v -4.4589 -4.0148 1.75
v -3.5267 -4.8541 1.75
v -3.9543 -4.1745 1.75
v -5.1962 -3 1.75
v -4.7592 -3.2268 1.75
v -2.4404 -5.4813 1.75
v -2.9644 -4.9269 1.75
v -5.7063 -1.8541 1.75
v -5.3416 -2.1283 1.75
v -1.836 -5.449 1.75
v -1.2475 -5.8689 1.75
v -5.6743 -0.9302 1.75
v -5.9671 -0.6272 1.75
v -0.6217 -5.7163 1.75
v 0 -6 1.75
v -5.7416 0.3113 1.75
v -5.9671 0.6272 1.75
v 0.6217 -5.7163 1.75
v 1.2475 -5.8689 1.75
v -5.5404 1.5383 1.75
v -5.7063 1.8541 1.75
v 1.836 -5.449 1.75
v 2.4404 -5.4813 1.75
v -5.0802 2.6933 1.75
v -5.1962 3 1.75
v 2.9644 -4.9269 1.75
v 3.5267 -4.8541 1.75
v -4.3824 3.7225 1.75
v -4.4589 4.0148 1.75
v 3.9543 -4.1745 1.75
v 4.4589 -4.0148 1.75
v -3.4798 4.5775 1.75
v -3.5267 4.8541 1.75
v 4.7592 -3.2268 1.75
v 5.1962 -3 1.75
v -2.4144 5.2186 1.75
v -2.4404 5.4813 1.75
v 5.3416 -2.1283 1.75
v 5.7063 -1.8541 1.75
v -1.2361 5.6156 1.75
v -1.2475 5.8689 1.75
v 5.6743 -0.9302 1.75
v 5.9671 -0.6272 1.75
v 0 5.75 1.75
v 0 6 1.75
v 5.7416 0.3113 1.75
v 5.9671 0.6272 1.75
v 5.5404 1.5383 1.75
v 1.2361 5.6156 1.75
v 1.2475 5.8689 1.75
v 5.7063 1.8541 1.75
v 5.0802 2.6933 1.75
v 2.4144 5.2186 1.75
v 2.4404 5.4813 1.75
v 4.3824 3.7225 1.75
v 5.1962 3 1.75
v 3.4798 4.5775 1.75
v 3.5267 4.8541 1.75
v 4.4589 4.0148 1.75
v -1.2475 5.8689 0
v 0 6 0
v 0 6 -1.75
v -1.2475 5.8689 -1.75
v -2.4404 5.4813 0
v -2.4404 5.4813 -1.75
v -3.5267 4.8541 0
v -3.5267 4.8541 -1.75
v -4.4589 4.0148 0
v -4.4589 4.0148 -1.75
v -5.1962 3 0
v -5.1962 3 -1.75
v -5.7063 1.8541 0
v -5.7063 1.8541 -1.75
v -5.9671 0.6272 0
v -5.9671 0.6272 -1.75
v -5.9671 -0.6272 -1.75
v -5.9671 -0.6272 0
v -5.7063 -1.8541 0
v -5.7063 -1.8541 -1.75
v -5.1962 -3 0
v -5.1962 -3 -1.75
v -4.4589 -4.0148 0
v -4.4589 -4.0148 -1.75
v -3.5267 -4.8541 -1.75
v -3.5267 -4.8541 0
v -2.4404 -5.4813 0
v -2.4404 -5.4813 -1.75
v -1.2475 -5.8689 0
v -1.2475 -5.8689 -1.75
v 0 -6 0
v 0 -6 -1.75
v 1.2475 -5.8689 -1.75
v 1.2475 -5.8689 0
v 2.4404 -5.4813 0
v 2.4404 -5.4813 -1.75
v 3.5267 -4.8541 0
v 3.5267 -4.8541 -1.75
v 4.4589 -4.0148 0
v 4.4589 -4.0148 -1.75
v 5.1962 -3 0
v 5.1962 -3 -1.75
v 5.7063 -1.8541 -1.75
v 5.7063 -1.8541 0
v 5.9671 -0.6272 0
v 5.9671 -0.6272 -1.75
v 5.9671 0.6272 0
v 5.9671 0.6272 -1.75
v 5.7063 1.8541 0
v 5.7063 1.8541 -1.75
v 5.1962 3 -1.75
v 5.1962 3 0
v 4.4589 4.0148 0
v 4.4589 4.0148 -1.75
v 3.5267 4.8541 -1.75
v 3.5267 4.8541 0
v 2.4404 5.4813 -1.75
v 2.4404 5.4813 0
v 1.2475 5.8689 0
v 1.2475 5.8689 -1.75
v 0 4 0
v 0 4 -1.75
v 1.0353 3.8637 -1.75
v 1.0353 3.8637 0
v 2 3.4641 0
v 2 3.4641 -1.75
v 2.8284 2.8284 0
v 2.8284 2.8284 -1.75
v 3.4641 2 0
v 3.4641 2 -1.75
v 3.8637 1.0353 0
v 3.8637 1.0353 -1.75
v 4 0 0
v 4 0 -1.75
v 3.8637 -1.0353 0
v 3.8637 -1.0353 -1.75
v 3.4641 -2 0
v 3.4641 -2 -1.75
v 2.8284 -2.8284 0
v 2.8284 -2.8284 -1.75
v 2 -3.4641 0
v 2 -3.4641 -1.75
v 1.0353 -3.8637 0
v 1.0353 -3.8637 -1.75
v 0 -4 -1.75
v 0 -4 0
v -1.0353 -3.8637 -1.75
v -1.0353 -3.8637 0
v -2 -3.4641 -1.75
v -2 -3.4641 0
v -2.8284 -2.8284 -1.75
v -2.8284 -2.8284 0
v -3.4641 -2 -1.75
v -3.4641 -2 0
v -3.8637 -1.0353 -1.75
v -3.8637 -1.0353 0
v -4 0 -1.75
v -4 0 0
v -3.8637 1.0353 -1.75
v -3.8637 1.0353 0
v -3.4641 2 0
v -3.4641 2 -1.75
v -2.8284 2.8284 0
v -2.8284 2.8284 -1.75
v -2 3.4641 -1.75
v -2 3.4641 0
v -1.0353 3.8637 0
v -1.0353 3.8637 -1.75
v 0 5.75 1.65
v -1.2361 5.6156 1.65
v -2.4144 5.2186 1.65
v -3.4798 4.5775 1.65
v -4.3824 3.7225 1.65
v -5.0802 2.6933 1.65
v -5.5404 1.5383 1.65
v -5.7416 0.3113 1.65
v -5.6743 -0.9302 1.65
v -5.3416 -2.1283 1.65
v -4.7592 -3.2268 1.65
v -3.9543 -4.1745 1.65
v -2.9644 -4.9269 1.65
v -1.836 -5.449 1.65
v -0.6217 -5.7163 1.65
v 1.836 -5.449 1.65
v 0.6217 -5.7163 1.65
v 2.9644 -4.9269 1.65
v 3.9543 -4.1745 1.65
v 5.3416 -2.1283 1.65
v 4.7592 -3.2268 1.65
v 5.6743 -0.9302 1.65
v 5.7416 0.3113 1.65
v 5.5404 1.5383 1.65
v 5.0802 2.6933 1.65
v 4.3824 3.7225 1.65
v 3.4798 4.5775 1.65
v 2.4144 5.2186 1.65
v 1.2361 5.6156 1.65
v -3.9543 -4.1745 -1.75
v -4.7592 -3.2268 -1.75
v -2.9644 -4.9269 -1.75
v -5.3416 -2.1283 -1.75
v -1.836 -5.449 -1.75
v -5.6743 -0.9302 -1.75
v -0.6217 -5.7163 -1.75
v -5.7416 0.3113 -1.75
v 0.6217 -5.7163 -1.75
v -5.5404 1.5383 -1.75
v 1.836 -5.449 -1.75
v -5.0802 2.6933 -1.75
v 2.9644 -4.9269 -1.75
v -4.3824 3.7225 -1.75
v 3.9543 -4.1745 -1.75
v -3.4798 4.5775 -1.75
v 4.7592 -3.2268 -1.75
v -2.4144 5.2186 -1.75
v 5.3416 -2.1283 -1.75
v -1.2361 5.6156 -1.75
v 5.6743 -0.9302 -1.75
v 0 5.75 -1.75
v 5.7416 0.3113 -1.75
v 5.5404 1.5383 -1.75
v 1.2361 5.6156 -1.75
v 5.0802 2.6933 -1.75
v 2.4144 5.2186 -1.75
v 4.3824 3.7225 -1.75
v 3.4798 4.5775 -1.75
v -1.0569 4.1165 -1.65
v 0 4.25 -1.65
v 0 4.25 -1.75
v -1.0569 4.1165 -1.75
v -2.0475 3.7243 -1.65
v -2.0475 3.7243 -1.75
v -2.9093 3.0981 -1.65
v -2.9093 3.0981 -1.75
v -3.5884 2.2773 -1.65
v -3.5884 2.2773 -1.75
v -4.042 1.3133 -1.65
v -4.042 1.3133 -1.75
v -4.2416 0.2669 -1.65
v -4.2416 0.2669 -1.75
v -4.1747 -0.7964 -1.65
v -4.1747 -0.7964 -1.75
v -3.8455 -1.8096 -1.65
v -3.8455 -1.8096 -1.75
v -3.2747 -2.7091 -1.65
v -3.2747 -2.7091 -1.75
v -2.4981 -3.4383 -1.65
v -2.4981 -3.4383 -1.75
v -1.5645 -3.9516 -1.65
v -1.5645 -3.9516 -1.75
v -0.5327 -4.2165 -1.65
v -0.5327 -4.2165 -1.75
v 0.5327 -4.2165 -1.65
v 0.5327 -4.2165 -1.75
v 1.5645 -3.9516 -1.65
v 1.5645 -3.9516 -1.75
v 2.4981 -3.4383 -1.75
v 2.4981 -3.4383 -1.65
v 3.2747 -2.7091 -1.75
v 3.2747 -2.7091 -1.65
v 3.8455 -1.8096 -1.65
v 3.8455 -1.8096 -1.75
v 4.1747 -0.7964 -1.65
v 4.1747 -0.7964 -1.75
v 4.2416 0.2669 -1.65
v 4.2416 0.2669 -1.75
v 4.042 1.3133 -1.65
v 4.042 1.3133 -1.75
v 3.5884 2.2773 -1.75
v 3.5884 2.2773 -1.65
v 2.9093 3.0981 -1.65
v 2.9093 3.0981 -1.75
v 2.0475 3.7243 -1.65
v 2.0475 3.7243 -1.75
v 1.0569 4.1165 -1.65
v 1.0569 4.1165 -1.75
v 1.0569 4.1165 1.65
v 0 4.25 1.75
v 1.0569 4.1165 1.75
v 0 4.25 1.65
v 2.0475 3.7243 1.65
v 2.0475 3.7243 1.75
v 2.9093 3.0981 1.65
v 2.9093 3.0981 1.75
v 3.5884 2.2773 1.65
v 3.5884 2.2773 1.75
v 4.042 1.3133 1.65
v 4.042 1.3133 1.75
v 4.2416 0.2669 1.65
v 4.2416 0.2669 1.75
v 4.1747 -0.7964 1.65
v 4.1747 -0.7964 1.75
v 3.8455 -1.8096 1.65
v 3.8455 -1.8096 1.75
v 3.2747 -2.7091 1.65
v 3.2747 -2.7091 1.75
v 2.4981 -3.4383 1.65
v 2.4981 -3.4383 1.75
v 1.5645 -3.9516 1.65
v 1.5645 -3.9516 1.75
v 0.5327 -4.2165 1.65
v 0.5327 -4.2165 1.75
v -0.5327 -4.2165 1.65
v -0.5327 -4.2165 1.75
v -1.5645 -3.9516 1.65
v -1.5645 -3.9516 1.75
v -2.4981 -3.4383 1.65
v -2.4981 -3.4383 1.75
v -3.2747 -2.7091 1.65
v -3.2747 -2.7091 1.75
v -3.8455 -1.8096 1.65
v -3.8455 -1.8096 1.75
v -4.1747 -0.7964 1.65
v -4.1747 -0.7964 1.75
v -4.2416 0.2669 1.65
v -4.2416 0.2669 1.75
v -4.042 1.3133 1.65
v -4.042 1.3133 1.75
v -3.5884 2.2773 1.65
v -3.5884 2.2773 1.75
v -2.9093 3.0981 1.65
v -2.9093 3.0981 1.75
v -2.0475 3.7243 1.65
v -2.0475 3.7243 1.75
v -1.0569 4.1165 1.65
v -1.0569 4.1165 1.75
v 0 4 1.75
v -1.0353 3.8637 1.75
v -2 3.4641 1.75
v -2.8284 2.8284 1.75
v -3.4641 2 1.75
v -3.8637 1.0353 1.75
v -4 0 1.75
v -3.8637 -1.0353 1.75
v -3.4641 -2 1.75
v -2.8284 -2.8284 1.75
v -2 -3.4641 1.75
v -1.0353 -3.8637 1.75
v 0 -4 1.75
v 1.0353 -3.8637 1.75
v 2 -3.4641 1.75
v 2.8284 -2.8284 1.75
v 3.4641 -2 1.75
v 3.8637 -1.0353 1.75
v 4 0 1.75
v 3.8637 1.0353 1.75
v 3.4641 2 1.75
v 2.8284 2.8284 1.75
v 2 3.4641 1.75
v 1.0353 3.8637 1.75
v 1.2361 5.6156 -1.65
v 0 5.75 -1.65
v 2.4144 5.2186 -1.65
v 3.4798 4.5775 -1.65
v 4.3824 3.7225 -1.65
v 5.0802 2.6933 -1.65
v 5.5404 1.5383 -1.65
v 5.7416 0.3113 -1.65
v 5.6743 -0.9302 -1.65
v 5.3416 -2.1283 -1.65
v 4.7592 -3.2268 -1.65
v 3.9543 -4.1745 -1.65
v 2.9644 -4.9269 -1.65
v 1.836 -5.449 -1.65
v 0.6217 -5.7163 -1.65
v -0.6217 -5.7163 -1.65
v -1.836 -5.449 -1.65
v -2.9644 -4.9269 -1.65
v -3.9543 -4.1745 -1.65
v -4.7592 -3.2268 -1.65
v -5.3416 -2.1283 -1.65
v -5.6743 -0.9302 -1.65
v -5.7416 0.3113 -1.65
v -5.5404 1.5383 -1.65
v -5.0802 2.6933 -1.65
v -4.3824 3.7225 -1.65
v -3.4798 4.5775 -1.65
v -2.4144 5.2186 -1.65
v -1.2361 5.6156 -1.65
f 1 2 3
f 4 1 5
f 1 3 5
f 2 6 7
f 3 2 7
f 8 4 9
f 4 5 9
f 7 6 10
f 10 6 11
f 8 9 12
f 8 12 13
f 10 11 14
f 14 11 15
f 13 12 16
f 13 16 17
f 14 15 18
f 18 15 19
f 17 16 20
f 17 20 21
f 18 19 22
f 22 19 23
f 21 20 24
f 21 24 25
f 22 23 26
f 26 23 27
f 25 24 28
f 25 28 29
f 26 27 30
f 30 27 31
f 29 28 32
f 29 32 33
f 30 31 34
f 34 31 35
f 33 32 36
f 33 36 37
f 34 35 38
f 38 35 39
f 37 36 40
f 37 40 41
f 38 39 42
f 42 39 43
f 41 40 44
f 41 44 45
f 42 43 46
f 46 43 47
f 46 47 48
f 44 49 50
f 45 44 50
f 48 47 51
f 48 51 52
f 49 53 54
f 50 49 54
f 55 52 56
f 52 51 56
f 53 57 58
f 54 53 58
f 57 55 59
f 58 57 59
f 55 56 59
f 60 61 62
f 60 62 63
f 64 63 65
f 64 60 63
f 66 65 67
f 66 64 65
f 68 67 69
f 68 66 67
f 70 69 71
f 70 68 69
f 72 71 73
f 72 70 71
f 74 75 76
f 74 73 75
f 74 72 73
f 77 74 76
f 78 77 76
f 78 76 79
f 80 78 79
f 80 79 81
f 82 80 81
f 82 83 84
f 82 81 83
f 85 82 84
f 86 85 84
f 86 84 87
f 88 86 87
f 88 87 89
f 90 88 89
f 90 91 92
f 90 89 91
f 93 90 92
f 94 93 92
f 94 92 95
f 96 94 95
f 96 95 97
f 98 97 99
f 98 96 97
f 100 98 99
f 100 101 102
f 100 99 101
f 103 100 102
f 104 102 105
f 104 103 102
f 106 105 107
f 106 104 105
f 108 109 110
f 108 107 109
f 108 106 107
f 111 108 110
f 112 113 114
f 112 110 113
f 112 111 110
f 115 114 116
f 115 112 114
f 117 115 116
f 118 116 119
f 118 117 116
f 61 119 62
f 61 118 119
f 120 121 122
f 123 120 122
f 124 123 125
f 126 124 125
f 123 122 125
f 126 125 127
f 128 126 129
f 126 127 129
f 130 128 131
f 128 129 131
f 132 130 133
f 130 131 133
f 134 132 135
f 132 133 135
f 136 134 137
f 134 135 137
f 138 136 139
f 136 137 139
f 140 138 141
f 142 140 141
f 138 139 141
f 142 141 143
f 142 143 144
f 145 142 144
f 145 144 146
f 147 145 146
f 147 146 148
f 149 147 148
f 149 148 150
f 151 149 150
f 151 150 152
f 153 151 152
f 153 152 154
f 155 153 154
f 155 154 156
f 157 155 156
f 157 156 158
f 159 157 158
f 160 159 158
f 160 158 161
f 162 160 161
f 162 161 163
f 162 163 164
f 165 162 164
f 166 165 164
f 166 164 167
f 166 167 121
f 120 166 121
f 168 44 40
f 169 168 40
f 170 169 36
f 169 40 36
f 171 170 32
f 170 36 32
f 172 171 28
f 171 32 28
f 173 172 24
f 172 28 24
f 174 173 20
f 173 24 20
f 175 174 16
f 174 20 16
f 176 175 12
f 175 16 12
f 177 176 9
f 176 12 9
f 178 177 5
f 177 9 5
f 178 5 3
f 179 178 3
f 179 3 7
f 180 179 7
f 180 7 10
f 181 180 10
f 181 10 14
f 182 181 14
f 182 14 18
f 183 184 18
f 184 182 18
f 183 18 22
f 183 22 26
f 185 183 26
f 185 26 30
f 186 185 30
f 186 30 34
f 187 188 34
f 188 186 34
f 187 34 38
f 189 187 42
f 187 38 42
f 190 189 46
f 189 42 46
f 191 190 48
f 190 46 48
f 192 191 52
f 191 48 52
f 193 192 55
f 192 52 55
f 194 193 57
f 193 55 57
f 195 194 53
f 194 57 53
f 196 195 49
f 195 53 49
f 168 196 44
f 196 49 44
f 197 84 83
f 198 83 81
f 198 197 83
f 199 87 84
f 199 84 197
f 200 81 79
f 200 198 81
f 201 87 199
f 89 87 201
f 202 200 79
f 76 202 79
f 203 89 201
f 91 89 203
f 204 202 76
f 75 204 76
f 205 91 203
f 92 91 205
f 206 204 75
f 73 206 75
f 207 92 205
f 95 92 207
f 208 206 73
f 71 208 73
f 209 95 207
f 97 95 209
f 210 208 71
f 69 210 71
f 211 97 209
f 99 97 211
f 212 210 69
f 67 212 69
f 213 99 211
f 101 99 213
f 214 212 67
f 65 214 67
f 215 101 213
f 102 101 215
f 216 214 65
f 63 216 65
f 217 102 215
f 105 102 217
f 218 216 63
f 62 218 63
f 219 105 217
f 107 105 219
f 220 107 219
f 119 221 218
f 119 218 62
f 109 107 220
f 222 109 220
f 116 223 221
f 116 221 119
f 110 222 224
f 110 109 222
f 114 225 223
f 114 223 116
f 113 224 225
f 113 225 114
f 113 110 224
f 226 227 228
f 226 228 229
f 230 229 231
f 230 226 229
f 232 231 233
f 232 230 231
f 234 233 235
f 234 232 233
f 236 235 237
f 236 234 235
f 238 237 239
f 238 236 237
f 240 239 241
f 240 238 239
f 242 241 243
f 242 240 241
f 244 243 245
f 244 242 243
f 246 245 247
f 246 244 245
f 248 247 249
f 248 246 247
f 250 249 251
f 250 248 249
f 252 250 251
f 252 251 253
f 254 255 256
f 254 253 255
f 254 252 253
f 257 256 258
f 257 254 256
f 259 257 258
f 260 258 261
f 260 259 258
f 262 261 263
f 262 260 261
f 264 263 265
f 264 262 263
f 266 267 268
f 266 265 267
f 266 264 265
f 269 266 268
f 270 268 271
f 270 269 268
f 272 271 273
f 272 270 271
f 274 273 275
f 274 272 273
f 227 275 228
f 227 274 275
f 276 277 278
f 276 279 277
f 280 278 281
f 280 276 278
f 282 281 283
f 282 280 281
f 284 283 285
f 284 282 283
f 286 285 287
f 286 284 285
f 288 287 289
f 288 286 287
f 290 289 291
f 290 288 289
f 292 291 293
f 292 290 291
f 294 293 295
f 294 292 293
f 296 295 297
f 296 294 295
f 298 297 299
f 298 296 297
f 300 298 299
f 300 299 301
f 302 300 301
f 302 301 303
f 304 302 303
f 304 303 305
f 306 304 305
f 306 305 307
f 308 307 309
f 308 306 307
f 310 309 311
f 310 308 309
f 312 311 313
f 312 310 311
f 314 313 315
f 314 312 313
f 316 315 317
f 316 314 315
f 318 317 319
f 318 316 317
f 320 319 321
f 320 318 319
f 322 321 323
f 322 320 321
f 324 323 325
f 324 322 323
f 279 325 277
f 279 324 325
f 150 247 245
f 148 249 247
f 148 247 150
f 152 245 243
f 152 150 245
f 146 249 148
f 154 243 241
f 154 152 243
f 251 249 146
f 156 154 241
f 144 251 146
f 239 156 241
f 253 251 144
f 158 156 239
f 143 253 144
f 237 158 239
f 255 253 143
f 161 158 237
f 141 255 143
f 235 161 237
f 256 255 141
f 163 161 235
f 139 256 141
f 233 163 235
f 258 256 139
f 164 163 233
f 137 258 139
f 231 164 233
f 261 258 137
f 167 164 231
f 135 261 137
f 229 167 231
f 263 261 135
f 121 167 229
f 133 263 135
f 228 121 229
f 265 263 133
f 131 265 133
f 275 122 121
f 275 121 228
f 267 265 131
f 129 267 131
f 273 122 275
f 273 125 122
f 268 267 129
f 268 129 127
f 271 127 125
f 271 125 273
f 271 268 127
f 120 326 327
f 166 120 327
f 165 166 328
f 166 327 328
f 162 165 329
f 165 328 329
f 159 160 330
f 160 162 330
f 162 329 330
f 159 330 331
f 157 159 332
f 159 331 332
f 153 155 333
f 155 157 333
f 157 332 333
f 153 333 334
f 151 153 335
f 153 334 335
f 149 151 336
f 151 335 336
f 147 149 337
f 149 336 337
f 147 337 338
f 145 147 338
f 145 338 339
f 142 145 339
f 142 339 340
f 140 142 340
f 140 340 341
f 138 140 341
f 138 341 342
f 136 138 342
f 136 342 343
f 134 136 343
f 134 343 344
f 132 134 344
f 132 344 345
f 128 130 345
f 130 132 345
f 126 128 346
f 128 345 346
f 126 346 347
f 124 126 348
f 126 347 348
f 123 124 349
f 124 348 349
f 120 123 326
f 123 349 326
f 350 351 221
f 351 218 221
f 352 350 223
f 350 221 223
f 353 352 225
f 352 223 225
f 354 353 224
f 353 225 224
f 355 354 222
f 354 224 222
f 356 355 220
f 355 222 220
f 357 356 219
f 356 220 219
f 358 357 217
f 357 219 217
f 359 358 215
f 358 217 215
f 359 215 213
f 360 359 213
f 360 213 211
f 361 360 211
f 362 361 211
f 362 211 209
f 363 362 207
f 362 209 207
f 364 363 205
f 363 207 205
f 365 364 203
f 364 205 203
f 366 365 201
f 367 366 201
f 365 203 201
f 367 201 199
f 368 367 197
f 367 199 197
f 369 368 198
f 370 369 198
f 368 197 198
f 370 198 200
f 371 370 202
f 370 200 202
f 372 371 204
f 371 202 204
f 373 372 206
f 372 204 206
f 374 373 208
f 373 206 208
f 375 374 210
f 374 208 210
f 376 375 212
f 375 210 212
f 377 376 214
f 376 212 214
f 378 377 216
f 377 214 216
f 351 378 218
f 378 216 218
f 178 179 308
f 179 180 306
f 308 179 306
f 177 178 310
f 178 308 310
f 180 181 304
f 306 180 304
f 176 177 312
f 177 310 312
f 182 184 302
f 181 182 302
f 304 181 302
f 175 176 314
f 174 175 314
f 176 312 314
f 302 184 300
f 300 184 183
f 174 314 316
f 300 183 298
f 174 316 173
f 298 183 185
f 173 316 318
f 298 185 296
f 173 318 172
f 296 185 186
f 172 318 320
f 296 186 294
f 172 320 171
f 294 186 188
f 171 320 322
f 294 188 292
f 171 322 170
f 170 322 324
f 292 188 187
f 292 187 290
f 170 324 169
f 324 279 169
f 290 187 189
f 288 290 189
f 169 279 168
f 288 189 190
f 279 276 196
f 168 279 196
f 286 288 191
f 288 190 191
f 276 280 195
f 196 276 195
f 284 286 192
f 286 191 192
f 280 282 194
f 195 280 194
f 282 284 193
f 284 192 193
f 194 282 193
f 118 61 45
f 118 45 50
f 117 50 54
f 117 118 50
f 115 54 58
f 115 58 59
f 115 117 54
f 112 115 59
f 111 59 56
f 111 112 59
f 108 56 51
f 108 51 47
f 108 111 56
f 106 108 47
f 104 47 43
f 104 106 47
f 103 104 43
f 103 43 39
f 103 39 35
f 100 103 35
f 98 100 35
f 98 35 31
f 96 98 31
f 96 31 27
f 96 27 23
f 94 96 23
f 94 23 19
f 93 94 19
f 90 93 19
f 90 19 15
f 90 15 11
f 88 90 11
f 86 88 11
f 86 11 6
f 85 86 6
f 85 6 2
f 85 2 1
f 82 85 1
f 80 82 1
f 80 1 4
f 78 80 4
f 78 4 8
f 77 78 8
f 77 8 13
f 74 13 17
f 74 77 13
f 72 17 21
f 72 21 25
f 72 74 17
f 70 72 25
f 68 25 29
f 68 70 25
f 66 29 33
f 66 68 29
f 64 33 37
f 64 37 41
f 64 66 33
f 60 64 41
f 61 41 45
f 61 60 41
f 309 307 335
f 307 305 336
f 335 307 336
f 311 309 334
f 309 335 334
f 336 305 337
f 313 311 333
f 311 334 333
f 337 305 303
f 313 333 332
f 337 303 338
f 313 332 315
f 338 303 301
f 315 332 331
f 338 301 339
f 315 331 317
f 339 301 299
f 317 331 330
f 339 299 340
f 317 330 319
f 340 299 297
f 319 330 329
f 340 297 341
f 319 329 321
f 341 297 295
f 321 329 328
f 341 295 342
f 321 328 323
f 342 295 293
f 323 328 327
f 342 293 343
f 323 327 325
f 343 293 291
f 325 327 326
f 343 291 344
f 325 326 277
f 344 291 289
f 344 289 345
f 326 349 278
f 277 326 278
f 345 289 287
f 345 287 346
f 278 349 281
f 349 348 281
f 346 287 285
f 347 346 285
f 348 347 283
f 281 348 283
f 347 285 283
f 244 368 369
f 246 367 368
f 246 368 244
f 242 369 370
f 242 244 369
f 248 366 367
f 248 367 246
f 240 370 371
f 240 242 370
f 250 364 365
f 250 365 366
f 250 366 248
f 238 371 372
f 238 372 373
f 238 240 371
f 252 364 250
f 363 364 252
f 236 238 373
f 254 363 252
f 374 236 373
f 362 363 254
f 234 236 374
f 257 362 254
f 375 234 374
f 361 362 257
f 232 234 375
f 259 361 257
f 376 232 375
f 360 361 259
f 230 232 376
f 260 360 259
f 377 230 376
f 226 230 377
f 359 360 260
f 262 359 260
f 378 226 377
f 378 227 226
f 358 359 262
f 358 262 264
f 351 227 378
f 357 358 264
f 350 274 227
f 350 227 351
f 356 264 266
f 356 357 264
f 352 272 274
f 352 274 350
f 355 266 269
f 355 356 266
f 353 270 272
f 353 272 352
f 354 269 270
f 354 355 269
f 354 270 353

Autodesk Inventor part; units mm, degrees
ref_plane "YZ Plane" through (0, 0, 0) normal (1, 0, 0) x (0, 1, 0)
ref_plane "XZ Plane" through (0, 0, 0) normal (0, 1, 0) x (-1, 0, 0)
ref_plane "XY Plane" through (0, 0, 0) normal (0, 0, 1) x (1, 0, 0)
sketch "Sketch1" plane through (0, 0, 0) normal (1, 0, 0) x (0, 1, 0)
  line L0 (0, 0) -> (0, -2.1848) construction
  line L1 (0, 0) -> (4, 0) construction
  line L2 (4, 0) -> (4, -1.75)
  line L3 (4, -1.75) -> (4.25, -1.75)
  line L4 (4.25, -1.75) -> (4.25, -1.65)
  line L5 (4.25, -1.65) -> (5.75, -1.65)
  line L6 (5.75, -1.65) -> (5.75, -1.75)
  line L7 (5.75, -1.75) -> (6, -1.75)
  line L8 (6, -1.75) -> (6, 0)
  line L9 (6, 0) -> (4, 0) construction
  line L10 (4, 0) -> (4, 1.75)
  line L11 (4, 1.75) -> (4.25, 1.75)
  line L12 (4.25, 1.75) -> (4.25, 1.65)
  line L13 (4.25, 1.65) -> (5.75, 1.65)
  line L14 (5.75, 1.65) -> (5.75, 1.75)
  line L15 (5.75, 1.75) -> (6, 1.75)
  line L16 (6, 1.75) -> (6, 0)
  dimension "d0" = 4
  dimension "d1" = 6
  dimension "d2" = 0.1
  dimension "d3" = 1.5
  dimension "d6" = 3.5
revolve "Revolution1" add sketch "Sketch1" angle 360 about axis through (0, 0, 0) along (0, 0, -1)
properties part number "MR128 bearing"
